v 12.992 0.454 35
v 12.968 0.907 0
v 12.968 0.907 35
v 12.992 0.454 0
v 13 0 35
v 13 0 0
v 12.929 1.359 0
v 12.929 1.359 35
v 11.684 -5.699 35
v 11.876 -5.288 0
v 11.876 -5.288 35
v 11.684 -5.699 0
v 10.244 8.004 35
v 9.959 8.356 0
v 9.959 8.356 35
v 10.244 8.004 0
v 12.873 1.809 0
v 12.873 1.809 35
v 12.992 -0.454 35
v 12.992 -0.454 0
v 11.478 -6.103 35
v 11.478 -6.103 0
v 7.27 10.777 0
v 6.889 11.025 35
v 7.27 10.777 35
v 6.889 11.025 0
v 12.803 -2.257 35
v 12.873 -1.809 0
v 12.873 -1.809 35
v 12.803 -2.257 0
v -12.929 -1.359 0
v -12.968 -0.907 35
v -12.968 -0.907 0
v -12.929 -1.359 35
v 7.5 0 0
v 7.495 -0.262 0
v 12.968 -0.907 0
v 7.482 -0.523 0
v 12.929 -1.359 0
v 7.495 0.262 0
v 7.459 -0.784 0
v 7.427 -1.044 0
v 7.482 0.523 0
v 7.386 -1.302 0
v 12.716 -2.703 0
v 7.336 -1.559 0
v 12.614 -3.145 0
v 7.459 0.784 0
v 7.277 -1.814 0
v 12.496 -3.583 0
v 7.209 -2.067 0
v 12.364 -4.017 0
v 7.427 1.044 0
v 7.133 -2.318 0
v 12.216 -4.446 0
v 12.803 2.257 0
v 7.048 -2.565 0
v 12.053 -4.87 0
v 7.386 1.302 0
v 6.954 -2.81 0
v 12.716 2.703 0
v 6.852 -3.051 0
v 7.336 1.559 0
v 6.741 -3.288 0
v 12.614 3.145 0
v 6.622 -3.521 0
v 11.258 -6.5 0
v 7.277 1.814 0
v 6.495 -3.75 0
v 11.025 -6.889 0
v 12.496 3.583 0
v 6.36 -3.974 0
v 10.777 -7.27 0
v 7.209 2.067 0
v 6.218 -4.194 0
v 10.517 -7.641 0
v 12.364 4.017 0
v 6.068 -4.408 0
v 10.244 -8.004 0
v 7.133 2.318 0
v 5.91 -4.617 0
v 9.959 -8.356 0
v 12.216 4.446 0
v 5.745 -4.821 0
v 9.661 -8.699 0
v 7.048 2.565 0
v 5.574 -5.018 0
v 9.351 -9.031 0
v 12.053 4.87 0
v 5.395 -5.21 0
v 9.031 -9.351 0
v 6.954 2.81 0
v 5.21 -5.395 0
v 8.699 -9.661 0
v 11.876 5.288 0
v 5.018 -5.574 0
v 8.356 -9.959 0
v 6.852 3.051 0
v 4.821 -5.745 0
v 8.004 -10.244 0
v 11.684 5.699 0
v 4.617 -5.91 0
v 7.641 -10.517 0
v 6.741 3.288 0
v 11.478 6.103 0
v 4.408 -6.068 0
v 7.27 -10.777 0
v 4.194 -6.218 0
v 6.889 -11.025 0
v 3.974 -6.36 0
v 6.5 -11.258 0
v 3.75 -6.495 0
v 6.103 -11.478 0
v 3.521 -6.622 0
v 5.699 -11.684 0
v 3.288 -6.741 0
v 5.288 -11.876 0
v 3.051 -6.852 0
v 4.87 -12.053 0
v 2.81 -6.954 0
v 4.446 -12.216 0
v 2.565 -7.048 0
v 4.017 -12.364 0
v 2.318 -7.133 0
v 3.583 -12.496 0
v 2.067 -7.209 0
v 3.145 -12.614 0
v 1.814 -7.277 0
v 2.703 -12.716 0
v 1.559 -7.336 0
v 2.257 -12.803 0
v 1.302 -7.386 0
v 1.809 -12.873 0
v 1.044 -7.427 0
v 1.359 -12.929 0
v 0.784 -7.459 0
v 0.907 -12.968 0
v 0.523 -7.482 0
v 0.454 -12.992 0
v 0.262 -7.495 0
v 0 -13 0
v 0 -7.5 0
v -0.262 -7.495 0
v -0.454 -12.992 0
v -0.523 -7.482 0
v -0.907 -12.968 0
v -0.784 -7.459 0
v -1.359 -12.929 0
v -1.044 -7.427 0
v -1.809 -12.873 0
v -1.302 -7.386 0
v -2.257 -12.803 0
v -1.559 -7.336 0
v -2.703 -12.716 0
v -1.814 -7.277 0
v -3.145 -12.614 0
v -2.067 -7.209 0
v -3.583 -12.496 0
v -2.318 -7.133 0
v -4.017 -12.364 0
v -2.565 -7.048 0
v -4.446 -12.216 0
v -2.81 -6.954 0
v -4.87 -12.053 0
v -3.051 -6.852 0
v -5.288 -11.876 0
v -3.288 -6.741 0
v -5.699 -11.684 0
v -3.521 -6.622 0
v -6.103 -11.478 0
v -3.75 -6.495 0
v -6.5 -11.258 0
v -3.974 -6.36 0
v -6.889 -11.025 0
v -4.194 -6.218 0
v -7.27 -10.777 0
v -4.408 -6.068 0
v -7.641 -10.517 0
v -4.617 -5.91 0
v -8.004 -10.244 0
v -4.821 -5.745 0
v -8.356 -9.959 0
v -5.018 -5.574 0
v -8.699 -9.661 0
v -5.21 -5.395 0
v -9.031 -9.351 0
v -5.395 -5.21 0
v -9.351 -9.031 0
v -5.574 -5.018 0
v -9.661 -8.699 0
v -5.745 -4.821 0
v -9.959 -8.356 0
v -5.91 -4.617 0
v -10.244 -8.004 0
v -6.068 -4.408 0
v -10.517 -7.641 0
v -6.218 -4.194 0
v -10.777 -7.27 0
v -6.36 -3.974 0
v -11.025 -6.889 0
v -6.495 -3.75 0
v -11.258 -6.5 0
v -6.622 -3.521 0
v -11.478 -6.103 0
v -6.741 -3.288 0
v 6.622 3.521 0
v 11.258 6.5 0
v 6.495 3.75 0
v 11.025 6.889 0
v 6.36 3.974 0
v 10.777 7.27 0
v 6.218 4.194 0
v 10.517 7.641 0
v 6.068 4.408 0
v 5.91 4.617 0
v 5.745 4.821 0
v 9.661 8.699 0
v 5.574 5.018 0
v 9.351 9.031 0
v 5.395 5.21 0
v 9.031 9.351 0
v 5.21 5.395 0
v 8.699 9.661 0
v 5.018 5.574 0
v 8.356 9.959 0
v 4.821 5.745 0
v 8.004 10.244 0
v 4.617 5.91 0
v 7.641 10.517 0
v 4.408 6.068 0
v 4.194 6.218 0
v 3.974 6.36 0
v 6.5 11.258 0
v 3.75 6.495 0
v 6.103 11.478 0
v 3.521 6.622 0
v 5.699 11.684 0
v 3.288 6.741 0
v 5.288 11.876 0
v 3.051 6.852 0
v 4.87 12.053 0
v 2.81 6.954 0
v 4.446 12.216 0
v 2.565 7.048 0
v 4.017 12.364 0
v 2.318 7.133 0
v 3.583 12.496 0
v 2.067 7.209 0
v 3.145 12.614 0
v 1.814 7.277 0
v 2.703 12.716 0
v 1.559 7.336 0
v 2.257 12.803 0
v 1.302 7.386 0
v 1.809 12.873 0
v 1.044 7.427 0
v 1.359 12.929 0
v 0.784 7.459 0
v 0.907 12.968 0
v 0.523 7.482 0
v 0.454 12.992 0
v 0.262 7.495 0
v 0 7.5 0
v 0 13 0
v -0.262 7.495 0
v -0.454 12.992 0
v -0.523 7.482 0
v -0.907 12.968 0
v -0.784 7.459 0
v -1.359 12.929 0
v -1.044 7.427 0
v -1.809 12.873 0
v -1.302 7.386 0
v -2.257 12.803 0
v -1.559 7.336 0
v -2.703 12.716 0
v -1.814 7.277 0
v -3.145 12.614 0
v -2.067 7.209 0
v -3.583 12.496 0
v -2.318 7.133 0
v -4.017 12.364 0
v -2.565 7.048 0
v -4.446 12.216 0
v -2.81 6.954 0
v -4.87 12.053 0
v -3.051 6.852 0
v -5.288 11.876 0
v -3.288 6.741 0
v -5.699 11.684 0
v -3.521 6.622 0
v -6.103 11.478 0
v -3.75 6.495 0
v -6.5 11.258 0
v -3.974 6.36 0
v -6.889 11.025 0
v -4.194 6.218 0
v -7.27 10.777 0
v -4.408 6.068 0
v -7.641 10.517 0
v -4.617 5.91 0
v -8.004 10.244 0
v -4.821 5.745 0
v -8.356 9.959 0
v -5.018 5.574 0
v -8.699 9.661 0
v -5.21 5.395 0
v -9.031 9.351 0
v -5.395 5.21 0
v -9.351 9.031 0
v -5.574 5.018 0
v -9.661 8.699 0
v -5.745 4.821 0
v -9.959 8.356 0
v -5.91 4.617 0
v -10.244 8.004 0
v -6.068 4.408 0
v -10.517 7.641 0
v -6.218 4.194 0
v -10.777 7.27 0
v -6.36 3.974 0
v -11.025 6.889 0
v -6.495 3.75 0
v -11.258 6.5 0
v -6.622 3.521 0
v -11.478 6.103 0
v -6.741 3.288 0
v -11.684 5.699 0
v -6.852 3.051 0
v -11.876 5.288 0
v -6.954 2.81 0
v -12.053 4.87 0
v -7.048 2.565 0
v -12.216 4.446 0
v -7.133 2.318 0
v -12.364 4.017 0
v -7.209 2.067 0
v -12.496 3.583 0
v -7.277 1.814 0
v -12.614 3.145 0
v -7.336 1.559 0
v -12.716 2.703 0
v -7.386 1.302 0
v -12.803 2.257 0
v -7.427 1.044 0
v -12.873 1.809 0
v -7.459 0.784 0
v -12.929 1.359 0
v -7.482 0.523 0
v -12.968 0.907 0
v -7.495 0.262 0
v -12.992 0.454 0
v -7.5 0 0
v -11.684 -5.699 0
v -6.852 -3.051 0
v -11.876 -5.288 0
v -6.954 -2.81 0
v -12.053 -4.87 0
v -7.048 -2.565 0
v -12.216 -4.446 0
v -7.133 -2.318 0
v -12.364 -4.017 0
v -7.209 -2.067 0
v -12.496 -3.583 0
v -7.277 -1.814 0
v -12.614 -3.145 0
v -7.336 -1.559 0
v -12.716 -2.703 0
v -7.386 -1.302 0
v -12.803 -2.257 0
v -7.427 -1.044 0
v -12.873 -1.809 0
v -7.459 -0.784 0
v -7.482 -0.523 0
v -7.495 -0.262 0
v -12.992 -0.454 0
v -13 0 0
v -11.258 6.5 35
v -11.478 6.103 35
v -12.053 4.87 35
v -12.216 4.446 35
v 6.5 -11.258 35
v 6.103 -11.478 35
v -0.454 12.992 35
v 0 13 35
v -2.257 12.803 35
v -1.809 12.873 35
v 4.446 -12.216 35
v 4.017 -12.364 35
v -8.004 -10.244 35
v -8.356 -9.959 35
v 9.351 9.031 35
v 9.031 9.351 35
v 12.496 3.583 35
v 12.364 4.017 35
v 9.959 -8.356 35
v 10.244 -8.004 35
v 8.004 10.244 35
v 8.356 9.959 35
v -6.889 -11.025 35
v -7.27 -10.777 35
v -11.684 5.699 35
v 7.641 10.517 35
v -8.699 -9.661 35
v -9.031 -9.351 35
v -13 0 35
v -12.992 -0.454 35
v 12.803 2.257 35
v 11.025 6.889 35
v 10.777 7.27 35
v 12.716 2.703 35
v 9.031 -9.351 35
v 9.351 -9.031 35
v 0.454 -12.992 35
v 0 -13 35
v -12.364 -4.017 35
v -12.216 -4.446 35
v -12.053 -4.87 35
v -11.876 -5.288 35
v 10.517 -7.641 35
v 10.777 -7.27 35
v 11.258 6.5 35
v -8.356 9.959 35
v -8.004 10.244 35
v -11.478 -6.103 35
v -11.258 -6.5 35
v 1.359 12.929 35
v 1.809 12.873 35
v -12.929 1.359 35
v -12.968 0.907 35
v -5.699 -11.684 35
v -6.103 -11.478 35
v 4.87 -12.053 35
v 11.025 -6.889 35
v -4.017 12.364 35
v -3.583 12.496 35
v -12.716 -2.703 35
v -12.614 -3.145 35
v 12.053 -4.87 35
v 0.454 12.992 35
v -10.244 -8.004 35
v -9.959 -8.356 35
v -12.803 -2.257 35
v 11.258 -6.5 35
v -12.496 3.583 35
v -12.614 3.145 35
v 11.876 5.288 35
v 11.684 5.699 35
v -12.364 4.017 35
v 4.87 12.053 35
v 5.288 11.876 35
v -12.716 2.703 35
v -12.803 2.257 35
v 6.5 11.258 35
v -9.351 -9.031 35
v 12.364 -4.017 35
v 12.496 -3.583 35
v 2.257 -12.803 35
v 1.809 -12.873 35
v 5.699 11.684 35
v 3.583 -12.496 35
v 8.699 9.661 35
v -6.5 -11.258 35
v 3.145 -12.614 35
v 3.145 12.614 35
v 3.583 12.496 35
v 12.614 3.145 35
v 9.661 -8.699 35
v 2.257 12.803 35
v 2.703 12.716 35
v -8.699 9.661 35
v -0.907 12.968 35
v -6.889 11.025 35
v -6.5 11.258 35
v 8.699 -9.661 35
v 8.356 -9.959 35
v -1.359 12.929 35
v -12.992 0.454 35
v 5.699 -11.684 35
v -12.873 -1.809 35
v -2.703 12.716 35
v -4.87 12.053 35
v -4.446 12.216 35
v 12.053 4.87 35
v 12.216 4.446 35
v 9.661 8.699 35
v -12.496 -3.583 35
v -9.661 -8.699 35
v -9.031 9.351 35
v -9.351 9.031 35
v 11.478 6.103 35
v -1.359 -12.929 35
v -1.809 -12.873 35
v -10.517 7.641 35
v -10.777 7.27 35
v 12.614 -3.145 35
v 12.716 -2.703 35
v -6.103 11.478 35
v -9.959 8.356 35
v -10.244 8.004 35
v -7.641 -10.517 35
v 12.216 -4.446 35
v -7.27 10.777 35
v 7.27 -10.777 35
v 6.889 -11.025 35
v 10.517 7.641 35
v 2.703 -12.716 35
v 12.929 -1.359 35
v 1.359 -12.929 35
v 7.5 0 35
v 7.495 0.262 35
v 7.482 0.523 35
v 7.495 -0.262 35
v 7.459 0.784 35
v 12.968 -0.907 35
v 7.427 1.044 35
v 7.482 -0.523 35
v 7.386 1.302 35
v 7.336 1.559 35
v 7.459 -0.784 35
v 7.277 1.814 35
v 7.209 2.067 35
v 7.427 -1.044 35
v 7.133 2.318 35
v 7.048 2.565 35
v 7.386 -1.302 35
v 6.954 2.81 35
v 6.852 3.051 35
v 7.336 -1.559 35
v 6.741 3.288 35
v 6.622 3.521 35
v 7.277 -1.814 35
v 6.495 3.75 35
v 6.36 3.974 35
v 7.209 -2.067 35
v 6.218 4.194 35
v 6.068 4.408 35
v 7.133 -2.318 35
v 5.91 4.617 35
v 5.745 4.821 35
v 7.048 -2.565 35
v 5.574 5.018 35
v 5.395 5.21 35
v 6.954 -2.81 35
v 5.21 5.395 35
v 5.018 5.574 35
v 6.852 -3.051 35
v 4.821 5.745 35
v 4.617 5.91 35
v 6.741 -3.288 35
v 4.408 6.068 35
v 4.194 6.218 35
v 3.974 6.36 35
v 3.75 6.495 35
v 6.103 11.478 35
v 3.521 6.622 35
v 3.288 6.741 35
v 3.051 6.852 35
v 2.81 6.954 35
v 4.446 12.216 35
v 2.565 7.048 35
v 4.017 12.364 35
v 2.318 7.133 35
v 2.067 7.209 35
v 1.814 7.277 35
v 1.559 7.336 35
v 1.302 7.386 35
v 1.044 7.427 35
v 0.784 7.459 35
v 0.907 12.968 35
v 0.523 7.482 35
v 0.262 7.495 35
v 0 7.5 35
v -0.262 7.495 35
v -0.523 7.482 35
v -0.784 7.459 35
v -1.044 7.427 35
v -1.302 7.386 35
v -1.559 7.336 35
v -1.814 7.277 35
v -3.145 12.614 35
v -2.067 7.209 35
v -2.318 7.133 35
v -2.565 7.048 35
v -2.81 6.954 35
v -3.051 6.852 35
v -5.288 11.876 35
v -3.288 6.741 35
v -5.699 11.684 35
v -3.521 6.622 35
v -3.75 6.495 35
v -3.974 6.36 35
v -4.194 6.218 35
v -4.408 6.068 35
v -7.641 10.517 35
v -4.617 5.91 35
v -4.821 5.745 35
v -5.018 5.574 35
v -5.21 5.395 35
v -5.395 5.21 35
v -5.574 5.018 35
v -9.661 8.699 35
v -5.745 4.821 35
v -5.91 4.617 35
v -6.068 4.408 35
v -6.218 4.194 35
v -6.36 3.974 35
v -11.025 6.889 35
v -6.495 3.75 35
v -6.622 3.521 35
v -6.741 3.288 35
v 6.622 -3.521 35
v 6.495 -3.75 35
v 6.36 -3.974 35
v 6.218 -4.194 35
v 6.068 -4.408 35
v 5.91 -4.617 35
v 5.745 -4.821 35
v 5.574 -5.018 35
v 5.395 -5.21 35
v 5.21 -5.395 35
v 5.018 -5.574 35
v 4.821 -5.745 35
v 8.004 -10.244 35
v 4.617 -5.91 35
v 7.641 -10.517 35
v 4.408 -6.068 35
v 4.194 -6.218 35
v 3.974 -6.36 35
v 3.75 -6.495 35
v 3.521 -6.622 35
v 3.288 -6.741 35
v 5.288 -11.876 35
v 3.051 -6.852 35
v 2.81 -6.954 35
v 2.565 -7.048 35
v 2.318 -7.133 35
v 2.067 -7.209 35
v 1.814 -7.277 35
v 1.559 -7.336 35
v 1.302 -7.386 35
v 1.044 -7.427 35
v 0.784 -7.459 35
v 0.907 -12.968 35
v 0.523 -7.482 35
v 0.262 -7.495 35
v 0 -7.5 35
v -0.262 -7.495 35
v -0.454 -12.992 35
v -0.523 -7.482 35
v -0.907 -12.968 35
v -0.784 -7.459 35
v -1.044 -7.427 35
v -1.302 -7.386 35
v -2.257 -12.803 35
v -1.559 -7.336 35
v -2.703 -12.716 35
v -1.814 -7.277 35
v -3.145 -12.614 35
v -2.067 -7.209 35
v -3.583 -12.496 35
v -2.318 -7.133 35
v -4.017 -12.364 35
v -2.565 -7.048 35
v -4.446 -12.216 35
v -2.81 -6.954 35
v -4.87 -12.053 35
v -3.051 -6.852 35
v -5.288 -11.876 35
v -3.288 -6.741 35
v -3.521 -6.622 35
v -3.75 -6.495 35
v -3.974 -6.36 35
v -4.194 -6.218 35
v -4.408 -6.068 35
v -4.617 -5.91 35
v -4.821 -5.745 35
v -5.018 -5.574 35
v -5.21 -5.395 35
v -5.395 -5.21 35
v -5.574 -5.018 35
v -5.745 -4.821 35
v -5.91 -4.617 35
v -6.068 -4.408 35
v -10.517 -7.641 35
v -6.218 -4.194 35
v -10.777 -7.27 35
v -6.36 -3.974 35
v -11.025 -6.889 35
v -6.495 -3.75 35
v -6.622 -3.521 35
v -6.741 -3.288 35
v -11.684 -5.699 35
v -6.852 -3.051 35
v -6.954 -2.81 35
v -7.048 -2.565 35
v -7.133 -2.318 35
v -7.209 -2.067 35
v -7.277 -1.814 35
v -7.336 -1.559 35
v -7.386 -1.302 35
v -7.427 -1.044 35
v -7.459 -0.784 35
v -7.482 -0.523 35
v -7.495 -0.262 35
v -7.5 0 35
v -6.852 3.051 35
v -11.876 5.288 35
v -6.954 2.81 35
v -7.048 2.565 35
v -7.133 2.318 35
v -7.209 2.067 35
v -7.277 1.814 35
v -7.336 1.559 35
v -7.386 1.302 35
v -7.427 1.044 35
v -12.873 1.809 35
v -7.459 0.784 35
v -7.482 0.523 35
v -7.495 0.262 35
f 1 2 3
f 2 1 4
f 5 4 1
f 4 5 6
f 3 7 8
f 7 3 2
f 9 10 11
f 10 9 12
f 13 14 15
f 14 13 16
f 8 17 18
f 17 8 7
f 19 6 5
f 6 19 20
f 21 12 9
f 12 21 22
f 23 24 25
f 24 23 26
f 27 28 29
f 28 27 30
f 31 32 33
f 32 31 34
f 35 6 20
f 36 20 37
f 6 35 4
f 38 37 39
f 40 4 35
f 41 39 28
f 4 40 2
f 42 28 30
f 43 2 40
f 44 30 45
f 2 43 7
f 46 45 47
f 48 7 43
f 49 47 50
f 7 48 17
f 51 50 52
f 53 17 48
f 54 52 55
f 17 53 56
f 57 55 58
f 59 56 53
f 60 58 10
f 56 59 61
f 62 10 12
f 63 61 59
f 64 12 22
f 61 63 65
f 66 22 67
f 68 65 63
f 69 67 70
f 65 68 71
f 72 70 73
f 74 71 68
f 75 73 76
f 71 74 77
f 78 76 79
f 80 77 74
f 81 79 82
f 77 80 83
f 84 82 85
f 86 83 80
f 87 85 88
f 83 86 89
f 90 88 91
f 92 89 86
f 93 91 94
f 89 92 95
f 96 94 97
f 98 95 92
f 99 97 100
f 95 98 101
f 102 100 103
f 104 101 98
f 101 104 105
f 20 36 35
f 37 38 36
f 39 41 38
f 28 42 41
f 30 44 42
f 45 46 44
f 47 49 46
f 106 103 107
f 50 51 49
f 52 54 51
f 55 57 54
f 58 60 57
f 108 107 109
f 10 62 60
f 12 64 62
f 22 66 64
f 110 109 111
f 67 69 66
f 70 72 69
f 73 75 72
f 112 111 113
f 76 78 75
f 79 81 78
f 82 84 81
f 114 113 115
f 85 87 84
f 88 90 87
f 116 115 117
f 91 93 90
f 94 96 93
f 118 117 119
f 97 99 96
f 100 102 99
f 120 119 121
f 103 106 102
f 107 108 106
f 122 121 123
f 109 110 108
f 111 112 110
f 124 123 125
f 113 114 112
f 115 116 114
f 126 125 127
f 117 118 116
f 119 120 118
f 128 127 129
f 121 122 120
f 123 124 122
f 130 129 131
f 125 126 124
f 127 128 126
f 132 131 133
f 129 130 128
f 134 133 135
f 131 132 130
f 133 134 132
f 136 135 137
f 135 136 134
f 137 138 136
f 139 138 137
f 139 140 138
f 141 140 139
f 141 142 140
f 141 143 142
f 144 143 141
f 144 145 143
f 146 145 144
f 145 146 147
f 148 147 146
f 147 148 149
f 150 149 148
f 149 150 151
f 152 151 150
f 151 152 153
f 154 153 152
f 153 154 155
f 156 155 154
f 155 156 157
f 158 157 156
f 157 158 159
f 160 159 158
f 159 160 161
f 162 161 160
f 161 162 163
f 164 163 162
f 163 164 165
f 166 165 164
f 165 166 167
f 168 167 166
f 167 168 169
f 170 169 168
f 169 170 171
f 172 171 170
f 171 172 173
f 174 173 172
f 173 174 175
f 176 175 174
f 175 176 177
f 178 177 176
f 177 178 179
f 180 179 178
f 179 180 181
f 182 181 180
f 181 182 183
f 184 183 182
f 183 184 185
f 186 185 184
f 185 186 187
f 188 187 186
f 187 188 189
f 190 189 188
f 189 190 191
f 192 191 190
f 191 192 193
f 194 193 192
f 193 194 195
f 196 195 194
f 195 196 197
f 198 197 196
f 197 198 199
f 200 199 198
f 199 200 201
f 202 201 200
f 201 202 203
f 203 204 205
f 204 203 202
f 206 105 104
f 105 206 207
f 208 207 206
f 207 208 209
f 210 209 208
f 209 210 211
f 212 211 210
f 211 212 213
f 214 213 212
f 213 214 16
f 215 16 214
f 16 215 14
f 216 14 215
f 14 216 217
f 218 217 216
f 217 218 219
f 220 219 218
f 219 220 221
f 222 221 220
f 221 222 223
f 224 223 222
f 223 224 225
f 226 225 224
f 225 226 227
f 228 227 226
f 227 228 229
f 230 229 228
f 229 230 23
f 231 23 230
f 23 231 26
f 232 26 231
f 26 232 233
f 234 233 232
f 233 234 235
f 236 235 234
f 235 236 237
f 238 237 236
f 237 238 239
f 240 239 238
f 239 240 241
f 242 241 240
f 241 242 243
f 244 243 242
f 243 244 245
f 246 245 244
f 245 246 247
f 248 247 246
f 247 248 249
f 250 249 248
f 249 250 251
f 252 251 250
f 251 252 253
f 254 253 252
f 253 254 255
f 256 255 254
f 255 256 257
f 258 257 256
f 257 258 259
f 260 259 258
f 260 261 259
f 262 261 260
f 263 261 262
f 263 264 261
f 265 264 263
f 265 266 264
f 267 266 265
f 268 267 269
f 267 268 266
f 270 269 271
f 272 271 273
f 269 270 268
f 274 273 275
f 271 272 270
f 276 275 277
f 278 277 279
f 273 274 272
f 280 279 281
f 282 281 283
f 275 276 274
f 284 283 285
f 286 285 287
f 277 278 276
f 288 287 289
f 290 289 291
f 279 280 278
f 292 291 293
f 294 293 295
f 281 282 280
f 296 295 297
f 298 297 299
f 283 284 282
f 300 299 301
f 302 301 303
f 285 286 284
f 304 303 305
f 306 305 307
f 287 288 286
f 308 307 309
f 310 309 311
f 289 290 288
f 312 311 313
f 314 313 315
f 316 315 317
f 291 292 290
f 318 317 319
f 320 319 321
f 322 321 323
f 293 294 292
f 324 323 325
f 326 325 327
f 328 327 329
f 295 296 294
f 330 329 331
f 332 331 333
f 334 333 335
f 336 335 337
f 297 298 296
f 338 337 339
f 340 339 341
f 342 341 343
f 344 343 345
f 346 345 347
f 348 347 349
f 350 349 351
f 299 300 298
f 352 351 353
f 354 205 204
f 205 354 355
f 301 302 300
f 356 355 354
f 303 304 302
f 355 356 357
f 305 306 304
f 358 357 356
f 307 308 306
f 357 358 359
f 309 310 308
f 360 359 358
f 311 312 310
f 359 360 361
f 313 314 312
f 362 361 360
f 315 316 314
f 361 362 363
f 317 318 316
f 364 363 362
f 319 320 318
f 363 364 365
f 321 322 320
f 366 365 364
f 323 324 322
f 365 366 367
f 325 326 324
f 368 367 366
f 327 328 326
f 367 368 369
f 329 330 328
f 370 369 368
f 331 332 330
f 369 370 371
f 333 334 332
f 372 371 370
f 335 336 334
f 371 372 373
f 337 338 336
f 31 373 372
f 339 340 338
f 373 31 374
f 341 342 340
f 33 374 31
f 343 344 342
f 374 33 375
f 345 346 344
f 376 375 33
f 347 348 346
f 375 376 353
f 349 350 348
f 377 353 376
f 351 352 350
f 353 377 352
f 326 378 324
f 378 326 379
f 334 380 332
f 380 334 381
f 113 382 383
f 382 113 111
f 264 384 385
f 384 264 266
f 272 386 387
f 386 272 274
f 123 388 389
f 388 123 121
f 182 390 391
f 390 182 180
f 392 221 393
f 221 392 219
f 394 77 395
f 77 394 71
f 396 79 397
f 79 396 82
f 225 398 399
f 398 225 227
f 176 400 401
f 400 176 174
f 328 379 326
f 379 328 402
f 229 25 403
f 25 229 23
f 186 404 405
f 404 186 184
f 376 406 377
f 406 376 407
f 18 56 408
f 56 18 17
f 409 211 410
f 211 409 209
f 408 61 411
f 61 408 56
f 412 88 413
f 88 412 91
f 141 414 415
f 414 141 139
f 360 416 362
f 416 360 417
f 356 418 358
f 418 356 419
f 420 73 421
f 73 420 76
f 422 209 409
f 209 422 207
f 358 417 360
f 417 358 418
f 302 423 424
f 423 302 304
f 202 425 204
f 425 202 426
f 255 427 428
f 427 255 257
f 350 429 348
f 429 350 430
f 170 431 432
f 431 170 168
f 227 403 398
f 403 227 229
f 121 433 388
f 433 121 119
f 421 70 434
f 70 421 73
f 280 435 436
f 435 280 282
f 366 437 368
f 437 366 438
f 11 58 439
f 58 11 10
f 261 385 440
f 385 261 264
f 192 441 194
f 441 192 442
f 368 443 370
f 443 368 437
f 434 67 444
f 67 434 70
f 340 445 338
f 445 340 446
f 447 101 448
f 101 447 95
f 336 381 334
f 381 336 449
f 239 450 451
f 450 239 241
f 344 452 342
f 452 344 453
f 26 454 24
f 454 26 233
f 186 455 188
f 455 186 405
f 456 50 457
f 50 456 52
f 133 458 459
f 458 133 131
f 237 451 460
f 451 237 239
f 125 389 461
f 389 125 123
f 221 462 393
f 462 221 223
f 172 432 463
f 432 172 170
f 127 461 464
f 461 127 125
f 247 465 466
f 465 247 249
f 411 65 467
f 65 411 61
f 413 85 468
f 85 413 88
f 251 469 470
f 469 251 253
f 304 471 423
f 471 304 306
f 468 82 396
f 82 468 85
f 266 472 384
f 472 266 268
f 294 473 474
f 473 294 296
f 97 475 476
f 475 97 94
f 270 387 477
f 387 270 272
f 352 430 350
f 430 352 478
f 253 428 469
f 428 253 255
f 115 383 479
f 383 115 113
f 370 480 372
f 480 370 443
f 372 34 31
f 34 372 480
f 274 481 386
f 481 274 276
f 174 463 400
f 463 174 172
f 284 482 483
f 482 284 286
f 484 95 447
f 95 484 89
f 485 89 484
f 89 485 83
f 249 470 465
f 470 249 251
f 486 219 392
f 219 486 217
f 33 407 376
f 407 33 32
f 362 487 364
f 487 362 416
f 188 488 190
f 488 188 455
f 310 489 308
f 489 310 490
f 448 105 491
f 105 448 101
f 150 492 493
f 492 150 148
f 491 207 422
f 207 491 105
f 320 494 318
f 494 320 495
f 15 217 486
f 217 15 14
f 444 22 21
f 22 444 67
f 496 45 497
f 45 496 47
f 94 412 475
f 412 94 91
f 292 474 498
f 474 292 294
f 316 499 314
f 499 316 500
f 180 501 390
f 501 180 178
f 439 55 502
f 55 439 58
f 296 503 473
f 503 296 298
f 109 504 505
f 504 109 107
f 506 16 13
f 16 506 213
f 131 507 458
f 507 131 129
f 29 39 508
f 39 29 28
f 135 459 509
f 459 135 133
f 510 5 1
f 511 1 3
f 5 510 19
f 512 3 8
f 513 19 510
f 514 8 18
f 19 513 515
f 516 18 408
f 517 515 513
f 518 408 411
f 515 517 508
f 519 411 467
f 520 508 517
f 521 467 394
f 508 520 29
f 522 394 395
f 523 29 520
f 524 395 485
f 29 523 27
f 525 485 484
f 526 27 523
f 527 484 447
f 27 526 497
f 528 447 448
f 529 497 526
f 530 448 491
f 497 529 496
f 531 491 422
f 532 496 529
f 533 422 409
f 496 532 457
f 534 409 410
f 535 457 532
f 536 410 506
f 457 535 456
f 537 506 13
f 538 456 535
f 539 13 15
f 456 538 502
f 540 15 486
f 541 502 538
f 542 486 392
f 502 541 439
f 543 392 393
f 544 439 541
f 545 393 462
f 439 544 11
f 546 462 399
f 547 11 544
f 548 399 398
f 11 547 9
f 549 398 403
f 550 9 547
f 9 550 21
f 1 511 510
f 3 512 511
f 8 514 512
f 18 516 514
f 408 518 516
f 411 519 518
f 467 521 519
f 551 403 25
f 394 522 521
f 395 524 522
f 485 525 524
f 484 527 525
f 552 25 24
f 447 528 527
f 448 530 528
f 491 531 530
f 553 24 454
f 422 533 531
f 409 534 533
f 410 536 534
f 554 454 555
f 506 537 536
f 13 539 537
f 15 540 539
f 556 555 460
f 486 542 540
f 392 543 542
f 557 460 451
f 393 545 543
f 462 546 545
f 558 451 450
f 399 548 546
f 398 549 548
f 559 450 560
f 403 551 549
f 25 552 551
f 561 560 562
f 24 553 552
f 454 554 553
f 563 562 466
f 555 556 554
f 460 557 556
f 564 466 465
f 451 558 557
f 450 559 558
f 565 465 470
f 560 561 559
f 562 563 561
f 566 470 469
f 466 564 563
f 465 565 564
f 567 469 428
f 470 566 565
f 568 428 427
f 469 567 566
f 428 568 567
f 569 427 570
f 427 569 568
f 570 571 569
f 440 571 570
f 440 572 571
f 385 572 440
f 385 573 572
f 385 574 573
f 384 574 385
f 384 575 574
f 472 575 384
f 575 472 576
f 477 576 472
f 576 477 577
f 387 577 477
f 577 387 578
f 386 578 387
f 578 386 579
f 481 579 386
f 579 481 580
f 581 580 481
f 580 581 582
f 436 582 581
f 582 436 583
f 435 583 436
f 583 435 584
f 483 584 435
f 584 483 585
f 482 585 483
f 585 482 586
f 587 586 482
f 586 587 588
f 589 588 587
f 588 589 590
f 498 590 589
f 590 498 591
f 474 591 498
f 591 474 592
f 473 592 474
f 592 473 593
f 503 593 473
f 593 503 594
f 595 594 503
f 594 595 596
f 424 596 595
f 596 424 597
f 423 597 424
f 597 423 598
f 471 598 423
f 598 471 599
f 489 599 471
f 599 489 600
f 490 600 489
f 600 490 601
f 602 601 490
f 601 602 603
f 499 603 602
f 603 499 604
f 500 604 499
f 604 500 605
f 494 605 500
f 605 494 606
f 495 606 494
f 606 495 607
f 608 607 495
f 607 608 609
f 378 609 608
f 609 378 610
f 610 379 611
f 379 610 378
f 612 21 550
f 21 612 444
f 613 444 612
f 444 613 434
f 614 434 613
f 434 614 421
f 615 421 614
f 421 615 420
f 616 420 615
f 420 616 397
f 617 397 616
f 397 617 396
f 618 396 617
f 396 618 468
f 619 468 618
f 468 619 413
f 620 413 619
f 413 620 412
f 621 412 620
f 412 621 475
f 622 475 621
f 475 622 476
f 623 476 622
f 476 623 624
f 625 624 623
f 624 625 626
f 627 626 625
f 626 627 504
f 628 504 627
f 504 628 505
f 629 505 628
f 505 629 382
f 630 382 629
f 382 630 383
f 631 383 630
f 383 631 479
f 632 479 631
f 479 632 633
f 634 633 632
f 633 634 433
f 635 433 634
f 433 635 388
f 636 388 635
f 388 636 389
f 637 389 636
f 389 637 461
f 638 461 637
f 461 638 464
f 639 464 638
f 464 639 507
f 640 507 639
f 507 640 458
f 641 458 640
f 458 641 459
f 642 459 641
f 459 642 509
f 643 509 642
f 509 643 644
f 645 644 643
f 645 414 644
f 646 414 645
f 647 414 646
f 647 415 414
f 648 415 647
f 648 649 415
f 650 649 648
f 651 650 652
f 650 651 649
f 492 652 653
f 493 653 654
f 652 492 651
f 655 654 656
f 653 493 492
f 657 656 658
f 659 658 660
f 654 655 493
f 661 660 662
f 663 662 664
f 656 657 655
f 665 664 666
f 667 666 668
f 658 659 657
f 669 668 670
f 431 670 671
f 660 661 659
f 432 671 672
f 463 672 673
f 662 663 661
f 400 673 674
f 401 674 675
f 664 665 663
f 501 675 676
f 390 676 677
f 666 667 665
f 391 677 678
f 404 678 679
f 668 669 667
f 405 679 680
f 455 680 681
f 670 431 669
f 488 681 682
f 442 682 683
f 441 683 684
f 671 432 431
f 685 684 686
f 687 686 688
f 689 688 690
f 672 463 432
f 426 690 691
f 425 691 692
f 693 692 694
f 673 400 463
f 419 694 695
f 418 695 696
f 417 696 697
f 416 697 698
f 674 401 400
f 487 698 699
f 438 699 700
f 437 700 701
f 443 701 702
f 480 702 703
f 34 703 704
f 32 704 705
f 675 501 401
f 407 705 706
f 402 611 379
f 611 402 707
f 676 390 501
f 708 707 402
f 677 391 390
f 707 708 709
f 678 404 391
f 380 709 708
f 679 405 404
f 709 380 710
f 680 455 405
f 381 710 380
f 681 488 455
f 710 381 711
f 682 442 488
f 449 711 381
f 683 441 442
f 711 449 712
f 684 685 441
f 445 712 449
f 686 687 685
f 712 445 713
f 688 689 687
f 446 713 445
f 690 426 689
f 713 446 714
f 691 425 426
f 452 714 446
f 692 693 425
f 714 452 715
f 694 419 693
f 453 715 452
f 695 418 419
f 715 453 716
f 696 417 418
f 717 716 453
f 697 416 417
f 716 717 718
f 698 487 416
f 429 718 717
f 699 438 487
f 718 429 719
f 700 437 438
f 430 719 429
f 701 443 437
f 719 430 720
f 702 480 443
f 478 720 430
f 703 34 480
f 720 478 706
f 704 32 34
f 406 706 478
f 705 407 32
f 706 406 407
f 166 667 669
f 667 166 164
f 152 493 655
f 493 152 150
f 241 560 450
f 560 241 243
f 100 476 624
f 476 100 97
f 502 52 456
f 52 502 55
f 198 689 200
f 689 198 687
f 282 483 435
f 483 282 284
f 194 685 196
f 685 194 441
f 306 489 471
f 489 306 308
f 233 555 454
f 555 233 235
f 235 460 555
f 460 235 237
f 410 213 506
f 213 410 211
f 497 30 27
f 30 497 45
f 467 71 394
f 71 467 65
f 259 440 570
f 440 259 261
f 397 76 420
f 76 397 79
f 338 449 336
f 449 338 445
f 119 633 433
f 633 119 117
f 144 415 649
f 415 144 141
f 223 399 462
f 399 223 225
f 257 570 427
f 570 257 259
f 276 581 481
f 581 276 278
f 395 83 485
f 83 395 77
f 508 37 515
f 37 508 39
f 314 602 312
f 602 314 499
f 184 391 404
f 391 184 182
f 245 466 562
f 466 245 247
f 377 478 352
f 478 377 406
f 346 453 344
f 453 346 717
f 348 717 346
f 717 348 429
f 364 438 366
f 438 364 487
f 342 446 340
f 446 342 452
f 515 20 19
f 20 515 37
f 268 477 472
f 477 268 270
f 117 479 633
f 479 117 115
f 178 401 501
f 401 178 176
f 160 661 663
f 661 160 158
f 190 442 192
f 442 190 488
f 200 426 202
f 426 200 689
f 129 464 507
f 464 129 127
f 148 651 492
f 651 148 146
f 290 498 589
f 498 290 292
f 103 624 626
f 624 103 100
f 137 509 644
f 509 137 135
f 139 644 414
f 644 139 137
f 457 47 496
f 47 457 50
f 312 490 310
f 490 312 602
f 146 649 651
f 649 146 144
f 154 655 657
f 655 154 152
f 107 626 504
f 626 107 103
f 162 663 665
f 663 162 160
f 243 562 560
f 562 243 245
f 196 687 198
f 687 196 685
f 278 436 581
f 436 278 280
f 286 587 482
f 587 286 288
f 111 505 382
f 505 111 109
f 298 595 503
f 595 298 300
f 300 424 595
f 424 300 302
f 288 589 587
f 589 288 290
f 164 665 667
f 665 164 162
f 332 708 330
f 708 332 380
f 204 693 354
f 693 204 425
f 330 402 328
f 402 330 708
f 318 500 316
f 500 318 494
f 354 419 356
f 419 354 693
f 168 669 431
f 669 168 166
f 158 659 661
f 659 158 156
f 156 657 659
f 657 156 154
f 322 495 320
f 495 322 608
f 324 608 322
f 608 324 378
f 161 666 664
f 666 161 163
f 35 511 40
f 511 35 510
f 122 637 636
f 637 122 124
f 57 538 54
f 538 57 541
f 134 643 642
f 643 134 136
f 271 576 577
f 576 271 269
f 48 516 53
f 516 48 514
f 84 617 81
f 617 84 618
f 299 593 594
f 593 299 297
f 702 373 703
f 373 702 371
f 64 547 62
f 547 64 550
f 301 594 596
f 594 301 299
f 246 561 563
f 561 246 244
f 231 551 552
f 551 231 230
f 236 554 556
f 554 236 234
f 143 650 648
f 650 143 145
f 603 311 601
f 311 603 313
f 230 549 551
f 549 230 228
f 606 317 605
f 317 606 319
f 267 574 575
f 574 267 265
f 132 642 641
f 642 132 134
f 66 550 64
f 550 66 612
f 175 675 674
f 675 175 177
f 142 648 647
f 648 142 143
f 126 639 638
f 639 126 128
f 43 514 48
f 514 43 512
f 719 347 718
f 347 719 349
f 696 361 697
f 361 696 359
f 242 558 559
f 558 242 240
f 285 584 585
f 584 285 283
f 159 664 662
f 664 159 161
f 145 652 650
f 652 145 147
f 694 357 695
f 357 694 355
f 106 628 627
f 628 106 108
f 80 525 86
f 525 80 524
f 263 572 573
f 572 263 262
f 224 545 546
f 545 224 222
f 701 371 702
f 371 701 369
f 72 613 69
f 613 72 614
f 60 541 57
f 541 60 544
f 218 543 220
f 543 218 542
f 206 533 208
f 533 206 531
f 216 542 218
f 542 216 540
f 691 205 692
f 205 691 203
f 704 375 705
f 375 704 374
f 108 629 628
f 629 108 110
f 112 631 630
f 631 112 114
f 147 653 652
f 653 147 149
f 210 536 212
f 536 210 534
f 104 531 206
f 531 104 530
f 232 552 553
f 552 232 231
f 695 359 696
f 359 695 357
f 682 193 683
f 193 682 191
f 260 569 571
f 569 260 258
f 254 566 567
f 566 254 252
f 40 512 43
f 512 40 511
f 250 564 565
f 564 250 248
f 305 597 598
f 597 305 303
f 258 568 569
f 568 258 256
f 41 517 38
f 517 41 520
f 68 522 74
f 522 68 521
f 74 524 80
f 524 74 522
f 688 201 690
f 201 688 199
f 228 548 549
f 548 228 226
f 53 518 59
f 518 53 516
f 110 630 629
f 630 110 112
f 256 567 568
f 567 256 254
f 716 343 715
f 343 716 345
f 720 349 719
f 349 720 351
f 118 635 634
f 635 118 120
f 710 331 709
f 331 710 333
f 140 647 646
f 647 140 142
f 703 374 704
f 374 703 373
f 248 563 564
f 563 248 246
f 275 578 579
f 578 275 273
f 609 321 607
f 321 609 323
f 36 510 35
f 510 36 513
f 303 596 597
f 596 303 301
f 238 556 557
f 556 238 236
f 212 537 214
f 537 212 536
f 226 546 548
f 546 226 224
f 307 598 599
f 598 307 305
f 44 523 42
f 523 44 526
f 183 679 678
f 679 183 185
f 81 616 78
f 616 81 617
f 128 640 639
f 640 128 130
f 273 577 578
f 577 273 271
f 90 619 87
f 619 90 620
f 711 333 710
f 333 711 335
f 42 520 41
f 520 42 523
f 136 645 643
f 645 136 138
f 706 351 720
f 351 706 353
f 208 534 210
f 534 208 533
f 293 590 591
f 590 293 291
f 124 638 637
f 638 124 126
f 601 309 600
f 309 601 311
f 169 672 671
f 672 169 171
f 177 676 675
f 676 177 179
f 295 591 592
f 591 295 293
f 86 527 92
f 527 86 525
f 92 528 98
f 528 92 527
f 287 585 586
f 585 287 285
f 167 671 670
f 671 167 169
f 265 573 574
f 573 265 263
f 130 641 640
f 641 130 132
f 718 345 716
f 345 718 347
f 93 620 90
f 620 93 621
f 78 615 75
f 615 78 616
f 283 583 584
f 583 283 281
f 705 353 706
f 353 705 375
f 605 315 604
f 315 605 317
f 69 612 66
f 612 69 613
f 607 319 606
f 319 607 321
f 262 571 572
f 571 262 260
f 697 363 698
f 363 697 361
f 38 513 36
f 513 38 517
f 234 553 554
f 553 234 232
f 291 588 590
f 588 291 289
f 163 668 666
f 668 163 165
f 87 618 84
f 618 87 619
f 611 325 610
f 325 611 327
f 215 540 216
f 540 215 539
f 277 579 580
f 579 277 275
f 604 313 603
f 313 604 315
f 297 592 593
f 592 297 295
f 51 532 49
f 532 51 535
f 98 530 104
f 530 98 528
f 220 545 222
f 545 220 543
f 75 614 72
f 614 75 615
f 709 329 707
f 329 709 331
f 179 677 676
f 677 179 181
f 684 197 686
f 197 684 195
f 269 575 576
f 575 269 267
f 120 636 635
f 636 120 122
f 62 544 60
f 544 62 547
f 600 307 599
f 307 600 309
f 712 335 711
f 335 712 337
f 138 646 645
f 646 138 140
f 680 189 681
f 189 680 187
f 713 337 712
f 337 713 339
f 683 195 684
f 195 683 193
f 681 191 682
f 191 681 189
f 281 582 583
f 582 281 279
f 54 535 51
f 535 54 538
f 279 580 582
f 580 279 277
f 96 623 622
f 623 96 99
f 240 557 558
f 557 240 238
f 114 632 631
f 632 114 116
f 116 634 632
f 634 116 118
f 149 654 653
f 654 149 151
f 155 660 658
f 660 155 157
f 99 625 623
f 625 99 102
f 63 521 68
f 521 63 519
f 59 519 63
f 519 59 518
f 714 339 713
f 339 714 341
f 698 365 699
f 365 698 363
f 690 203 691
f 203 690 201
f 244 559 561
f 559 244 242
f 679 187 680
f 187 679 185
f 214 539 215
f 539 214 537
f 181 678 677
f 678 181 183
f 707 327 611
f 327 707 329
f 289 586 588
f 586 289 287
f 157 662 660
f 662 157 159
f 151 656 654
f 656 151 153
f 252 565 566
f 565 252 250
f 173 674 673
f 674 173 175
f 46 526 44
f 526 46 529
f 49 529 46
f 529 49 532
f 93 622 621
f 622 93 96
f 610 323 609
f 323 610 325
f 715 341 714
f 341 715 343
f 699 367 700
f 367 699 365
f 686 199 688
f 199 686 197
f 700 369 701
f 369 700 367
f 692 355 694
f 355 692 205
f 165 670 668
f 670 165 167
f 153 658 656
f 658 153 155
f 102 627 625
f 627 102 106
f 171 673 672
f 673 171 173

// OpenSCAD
$fa = 2;
$fs = 0.25;

inner_radius=7.5;
outer_radius=13;
height=35;

difference() {
    cylinder(r=outer_radius, h=height);
    cylinder(r=inner_radius, h=height);
}
